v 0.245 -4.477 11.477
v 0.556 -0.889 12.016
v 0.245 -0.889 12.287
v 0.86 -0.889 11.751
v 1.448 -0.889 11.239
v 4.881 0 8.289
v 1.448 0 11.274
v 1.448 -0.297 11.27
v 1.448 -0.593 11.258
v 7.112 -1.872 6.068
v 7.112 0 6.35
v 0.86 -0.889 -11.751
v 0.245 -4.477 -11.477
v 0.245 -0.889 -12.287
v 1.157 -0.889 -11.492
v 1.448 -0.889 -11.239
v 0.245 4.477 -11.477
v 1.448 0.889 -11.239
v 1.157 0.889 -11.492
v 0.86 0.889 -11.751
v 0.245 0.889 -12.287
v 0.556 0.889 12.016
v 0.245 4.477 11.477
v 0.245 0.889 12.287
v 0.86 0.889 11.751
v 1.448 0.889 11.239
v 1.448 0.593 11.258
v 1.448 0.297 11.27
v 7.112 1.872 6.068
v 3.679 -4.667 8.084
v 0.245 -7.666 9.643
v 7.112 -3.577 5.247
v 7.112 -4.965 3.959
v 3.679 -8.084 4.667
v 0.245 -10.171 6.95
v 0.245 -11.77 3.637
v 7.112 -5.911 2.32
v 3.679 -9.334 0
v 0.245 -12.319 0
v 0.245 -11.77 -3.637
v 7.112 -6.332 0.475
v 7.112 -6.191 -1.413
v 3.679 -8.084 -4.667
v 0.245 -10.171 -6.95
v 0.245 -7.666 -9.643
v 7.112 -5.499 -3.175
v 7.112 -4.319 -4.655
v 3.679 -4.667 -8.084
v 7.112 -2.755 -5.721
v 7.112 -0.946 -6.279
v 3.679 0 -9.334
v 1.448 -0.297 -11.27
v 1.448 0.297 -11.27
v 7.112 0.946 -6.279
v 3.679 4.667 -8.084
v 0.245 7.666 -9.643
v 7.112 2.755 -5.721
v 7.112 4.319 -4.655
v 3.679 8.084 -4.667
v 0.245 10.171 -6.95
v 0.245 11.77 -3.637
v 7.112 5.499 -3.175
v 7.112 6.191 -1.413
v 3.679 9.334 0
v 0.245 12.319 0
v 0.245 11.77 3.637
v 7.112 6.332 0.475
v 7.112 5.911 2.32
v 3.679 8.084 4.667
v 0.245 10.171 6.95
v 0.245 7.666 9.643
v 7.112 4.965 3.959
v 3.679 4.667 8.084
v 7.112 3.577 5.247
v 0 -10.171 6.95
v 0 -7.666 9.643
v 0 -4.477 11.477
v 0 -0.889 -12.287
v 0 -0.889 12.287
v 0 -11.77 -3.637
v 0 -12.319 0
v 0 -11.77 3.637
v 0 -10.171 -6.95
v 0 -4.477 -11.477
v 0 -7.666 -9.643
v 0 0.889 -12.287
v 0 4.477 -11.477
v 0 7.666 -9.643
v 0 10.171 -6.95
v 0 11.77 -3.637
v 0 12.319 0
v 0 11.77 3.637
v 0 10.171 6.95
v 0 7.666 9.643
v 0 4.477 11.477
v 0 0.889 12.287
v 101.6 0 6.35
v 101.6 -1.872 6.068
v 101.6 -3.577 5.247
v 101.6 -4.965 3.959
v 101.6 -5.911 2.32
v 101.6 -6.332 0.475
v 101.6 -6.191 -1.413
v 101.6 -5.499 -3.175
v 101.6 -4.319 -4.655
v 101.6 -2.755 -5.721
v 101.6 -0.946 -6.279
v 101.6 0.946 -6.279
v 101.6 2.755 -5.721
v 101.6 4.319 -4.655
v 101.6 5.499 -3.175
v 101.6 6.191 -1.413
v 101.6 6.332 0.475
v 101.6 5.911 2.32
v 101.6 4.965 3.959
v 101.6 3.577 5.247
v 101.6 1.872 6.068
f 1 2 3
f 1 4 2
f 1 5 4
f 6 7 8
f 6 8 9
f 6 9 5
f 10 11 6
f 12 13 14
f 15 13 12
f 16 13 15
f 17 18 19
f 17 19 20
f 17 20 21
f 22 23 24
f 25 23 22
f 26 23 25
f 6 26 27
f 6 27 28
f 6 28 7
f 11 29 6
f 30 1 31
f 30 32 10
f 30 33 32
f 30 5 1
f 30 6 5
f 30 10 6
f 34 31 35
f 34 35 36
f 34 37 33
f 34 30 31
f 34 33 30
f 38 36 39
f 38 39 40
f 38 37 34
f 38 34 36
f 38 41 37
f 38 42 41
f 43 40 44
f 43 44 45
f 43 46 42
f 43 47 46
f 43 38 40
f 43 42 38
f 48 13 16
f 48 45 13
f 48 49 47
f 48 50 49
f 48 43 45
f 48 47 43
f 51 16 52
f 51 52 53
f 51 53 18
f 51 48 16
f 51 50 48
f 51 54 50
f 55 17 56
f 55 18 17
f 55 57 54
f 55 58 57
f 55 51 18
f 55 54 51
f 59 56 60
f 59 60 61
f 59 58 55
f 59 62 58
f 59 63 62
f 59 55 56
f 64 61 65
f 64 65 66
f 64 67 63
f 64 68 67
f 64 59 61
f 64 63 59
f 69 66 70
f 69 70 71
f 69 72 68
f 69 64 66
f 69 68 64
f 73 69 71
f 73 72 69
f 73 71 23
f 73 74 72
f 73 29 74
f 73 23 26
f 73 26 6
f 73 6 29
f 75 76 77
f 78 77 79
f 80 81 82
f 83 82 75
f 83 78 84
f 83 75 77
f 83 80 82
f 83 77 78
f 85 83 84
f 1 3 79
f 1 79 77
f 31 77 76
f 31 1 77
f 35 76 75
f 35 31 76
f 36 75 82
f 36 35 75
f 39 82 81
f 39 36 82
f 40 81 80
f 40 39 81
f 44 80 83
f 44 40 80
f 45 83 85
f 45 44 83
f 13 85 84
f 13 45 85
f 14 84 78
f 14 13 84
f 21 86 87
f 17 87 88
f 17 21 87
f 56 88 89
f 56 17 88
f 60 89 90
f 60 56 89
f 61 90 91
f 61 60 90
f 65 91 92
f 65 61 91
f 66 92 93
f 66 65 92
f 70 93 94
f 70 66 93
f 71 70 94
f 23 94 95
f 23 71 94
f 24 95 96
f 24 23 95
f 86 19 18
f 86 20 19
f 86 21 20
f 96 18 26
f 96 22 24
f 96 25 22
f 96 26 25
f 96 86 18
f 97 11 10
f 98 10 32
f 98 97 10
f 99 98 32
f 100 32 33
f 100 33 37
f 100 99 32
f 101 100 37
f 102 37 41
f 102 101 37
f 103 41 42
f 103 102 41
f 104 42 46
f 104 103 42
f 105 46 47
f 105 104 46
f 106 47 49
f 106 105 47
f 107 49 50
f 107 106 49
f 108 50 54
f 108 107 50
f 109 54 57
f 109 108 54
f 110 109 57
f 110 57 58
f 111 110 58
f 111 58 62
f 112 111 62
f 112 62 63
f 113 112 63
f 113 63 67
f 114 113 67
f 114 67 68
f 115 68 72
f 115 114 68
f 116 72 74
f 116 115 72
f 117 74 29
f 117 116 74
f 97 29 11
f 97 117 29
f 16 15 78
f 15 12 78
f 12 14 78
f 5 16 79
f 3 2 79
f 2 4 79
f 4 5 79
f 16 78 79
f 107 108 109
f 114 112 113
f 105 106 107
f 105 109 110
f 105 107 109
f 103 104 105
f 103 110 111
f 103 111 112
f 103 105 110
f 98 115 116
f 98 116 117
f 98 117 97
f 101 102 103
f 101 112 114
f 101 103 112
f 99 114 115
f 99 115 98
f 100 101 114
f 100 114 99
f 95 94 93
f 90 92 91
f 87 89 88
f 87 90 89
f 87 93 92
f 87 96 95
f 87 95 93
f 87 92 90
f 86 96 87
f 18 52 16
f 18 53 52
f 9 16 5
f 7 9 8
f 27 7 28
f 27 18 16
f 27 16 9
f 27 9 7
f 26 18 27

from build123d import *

# Parameters (mm, degrees)
SKETCH6_W  = 24.638
SKETCH6_H  = 1.778
SLOT_DEPTH = 1.4478


with BuildPart() as part:
    # BodySke → Base-Revolve (revolve)
    with BuildSketch(Plane.XY, mode=Mode.PRIVATE) as base_revolve_sk:
        Polygon((0, 0), (0, 12.319), (0.245450977, 12.319), (7.112, 6.35), (101.6, 6.35), (101.6, 0), align=None)
    revolve(base_revolve_sk.sketch.rotate(Axis((-6.35, 0, 0), (1, 0, 0)), 90), axis=Axis((-6.35, 0, 0), (1, 0, 0)))

    # Sketch6 → Slot (cut)
    with BuildSketch(Plane.ZY):
        Rectangle(SKETCH6_W, SKETCH6_H)
    extrude(amount=-SLOT_DEPTH, mode=Mode.SUBTRACT)


solid = part.part
